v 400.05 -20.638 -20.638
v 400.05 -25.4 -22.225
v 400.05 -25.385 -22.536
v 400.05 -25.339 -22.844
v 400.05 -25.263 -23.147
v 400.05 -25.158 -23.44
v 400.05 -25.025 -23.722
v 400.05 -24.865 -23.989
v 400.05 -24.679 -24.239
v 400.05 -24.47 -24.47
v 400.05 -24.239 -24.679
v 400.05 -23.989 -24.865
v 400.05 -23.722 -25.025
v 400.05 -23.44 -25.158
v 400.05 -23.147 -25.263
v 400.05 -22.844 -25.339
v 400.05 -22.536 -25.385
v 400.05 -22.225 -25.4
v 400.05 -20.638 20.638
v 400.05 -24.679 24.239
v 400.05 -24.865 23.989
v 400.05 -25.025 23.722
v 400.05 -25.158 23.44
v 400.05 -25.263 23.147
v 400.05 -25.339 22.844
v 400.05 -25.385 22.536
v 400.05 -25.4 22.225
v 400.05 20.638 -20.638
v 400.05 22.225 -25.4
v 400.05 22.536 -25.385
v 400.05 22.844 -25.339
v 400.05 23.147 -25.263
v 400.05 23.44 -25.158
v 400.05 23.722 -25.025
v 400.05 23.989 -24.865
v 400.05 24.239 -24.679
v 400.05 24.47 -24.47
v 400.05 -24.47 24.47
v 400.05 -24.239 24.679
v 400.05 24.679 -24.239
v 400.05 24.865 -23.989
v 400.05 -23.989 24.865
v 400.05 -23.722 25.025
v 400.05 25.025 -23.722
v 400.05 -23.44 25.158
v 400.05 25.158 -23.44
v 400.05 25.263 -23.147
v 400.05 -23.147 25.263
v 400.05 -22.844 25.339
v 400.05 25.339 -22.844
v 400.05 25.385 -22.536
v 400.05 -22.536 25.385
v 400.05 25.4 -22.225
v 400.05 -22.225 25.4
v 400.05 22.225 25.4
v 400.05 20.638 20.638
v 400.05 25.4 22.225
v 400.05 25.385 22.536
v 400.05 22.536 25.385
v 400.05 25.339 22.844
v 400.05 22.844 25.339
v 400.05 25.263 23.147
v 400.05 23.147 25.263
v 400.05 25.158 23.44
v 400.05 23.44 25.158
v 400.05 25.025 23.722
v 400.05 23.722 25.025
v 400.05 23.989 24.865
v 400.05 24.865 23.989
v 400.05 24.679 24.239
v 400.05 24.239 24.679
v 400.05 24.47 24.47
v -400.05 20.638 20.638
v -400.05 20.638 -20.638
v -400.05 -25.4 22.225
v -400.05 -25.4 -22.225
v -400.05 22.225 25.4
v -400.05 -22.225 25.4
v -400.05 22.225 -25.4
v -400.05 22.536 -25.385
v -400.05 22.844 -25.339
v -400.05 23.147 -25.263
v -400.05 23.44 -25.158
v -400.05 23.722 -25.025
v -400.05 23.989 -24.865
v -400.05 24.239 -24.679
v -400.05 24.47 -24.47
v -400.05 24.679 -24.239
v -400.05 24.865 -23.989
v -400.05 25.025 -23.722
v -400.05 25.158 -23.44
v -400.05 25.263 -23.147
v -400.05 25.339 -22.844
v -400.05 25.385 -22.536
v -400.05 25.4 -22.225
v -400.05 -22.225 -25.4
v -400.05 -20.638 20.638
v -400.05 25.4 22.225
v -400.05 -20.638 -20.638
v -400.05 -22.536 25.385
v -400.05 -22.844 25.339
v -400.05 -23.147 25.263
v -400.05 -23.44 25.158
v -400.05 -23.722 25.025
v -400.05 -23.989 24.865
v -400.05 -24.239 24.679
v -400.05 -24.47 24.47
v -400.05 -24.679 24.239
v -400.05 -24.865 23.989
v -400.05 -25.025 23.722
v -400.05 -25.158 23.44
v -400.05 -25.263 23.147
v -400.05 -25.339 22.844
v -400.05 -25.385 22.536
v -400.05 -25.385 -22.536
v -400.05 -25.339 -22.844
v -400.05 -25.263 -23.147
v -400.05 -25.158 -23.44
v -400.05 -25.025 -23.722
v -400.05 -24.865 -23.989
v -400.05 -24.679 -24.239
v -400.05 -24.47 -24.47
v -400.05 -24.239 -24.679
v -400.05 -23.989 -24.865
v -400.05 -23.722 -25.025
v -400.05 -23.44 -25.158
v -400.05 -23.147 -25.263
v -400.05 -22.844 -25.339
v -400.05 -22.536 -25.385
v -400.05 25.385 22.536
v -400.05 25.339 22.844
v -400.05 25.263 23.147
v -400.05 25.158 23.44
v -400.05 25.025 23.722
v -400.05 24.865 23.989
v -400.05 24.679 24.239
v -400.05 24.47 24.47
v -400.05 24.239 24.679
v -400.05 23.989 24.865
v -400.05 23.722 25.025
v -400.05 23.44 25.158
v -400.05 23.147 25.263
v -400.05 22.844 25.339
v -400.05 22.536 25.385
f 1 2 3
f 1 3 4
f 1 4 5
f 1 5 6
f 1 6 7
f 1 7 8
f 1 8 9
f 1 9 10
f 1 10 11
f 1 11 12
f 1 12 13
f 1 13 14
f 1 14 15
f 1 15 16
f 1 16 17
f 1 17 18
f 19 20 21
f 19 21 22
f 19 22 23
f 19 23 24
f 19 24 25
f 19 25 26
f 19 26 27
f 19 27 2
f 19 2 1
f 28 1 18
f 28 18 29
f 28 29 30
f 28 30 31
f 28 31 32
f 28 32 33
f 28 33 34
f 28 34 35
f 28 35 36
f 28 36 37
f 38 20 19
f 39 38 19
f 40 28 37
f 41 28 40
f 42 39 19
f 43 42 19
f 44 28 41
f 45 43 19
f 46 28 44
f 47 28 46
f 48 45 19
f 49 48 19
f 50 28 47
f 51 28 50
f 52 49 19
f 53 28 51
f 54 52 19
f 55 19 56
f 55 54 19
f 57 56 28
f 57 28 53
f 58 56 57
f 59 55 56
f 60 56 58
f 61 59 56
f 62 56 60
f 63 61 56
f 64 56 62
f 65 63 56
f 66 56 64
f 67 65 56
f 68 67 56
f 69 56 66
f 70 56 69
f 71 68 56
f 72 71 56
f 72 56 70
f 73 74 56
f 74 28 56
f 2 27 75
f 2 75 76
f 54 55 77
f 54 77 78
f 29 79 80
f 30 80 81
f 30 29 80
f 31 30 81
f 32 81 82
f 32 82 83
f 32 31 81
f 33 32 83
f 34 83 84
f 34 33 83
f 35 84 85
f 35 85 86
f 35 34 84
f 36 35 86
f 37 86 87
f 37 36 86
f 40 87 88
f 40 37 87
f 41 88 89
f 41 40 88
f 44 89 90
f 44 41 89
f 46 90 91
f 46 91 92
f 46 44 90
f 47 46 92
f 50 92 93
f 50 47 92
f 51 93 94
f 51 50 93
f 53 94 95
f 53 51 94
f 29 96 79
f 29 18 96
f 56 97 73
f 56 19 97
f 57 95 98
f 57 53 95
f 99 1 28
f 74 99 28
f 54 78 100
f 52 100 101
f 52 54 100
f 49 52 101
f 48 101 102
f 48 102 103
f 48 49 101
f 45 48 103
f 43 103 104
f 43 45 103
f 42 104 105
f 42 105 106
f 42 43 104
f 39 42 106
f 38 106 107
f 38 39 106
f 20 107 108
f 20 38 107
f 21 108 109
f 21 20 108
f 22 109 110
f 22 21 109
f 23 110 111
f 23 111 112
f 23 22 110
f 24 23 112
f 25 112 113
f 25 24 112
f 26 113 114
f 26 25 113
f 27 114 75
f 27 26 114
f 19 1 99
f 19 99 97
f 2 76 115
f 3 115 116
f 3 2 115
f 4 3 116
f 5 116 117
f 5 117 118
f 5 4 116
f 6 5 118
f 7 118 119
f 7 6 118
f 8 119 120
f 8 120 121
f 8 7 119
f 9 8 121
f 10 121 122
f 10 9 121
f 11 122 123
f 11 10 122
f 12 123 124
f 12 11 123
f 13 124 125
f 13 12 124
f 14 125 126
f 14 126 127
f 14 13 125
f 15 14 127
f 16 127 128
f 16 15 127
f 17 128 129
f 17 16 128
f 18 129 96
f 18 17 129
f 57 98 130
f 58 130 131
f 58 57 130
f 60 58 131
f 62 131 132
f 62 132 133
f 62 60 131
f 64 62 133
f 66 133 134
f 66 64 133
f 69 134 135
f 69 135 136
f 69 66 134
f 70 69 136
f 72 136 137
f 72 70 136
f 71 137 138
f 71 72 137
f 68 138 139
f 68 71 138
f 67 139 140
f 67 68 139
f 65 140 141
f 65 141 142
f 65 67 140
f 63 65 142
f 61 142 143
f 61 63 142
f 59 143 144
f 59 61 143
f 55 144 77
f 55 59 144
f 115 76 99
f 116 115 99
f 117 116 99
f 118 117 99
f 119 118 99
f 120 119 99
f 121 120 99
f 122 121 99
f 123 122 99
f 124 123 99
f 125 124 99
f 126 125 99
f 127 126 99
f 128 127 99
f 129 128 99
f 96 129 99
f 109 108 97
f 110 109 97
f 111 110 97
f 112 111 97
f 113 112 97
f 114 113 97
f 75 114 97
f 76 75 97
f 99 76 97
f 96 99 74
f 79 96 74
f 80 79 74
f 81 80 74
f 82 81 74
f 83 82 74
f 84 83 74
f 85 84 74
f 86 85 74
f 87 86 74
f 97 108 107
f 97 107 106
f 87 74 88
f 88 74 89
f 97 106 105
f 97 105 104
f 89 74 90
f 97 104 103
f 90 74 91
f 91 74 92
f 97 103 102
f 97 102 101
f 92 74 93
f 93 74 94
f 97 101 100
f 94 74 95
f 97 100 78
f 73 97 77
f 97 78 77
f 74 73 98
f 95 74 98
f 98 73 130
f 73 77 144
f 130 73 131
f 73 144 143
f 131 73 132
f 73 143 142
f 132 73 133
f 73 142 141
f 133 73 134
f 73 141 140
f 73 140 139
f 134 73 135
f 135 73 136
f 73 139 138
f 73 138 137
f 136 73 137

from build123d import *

# Parameters (mm, degrees)
F0_W     = 41.275
F0_H     = 41.275
F1_DEPTH = 400.05


with BuildPart() as f1:
    # F0 (on Right) → F1 (new body, symmetric)
    with BuildSketch(Plane.YZ):
        with BuildLine():
            ThreePointArc((25.4, 22.225), (24.470064, 24.470064), (22.225, 25.4))
            Line((22.225, 25.4), (-22.225, 25.4))
            ThreePointArc((-22.225, 25.4), (-24.470064, 24.470064), (-25.4, 22.225))
            Line((-25.4, 22.225), (-25.4, -22.225))
            ThreePointArc((-25.4, -22.225), (-24.470064, -24.470064), (-22.225, -25.4))
            Line((-22.225, -25.4), (22.225, -25.4))
            ThreePointArc((22.225, -25.4), (24.470064, -24.470064), (25.4, -22.225))
            Line((25.4, -22.225), (25.4, 22.225))
        make_face()
        Rectangle(F0_W, F0_H, mode=Mode.SUBTRACT)
    extrude(amount=F1_DEPTH, both=True)


solid = f1.part
